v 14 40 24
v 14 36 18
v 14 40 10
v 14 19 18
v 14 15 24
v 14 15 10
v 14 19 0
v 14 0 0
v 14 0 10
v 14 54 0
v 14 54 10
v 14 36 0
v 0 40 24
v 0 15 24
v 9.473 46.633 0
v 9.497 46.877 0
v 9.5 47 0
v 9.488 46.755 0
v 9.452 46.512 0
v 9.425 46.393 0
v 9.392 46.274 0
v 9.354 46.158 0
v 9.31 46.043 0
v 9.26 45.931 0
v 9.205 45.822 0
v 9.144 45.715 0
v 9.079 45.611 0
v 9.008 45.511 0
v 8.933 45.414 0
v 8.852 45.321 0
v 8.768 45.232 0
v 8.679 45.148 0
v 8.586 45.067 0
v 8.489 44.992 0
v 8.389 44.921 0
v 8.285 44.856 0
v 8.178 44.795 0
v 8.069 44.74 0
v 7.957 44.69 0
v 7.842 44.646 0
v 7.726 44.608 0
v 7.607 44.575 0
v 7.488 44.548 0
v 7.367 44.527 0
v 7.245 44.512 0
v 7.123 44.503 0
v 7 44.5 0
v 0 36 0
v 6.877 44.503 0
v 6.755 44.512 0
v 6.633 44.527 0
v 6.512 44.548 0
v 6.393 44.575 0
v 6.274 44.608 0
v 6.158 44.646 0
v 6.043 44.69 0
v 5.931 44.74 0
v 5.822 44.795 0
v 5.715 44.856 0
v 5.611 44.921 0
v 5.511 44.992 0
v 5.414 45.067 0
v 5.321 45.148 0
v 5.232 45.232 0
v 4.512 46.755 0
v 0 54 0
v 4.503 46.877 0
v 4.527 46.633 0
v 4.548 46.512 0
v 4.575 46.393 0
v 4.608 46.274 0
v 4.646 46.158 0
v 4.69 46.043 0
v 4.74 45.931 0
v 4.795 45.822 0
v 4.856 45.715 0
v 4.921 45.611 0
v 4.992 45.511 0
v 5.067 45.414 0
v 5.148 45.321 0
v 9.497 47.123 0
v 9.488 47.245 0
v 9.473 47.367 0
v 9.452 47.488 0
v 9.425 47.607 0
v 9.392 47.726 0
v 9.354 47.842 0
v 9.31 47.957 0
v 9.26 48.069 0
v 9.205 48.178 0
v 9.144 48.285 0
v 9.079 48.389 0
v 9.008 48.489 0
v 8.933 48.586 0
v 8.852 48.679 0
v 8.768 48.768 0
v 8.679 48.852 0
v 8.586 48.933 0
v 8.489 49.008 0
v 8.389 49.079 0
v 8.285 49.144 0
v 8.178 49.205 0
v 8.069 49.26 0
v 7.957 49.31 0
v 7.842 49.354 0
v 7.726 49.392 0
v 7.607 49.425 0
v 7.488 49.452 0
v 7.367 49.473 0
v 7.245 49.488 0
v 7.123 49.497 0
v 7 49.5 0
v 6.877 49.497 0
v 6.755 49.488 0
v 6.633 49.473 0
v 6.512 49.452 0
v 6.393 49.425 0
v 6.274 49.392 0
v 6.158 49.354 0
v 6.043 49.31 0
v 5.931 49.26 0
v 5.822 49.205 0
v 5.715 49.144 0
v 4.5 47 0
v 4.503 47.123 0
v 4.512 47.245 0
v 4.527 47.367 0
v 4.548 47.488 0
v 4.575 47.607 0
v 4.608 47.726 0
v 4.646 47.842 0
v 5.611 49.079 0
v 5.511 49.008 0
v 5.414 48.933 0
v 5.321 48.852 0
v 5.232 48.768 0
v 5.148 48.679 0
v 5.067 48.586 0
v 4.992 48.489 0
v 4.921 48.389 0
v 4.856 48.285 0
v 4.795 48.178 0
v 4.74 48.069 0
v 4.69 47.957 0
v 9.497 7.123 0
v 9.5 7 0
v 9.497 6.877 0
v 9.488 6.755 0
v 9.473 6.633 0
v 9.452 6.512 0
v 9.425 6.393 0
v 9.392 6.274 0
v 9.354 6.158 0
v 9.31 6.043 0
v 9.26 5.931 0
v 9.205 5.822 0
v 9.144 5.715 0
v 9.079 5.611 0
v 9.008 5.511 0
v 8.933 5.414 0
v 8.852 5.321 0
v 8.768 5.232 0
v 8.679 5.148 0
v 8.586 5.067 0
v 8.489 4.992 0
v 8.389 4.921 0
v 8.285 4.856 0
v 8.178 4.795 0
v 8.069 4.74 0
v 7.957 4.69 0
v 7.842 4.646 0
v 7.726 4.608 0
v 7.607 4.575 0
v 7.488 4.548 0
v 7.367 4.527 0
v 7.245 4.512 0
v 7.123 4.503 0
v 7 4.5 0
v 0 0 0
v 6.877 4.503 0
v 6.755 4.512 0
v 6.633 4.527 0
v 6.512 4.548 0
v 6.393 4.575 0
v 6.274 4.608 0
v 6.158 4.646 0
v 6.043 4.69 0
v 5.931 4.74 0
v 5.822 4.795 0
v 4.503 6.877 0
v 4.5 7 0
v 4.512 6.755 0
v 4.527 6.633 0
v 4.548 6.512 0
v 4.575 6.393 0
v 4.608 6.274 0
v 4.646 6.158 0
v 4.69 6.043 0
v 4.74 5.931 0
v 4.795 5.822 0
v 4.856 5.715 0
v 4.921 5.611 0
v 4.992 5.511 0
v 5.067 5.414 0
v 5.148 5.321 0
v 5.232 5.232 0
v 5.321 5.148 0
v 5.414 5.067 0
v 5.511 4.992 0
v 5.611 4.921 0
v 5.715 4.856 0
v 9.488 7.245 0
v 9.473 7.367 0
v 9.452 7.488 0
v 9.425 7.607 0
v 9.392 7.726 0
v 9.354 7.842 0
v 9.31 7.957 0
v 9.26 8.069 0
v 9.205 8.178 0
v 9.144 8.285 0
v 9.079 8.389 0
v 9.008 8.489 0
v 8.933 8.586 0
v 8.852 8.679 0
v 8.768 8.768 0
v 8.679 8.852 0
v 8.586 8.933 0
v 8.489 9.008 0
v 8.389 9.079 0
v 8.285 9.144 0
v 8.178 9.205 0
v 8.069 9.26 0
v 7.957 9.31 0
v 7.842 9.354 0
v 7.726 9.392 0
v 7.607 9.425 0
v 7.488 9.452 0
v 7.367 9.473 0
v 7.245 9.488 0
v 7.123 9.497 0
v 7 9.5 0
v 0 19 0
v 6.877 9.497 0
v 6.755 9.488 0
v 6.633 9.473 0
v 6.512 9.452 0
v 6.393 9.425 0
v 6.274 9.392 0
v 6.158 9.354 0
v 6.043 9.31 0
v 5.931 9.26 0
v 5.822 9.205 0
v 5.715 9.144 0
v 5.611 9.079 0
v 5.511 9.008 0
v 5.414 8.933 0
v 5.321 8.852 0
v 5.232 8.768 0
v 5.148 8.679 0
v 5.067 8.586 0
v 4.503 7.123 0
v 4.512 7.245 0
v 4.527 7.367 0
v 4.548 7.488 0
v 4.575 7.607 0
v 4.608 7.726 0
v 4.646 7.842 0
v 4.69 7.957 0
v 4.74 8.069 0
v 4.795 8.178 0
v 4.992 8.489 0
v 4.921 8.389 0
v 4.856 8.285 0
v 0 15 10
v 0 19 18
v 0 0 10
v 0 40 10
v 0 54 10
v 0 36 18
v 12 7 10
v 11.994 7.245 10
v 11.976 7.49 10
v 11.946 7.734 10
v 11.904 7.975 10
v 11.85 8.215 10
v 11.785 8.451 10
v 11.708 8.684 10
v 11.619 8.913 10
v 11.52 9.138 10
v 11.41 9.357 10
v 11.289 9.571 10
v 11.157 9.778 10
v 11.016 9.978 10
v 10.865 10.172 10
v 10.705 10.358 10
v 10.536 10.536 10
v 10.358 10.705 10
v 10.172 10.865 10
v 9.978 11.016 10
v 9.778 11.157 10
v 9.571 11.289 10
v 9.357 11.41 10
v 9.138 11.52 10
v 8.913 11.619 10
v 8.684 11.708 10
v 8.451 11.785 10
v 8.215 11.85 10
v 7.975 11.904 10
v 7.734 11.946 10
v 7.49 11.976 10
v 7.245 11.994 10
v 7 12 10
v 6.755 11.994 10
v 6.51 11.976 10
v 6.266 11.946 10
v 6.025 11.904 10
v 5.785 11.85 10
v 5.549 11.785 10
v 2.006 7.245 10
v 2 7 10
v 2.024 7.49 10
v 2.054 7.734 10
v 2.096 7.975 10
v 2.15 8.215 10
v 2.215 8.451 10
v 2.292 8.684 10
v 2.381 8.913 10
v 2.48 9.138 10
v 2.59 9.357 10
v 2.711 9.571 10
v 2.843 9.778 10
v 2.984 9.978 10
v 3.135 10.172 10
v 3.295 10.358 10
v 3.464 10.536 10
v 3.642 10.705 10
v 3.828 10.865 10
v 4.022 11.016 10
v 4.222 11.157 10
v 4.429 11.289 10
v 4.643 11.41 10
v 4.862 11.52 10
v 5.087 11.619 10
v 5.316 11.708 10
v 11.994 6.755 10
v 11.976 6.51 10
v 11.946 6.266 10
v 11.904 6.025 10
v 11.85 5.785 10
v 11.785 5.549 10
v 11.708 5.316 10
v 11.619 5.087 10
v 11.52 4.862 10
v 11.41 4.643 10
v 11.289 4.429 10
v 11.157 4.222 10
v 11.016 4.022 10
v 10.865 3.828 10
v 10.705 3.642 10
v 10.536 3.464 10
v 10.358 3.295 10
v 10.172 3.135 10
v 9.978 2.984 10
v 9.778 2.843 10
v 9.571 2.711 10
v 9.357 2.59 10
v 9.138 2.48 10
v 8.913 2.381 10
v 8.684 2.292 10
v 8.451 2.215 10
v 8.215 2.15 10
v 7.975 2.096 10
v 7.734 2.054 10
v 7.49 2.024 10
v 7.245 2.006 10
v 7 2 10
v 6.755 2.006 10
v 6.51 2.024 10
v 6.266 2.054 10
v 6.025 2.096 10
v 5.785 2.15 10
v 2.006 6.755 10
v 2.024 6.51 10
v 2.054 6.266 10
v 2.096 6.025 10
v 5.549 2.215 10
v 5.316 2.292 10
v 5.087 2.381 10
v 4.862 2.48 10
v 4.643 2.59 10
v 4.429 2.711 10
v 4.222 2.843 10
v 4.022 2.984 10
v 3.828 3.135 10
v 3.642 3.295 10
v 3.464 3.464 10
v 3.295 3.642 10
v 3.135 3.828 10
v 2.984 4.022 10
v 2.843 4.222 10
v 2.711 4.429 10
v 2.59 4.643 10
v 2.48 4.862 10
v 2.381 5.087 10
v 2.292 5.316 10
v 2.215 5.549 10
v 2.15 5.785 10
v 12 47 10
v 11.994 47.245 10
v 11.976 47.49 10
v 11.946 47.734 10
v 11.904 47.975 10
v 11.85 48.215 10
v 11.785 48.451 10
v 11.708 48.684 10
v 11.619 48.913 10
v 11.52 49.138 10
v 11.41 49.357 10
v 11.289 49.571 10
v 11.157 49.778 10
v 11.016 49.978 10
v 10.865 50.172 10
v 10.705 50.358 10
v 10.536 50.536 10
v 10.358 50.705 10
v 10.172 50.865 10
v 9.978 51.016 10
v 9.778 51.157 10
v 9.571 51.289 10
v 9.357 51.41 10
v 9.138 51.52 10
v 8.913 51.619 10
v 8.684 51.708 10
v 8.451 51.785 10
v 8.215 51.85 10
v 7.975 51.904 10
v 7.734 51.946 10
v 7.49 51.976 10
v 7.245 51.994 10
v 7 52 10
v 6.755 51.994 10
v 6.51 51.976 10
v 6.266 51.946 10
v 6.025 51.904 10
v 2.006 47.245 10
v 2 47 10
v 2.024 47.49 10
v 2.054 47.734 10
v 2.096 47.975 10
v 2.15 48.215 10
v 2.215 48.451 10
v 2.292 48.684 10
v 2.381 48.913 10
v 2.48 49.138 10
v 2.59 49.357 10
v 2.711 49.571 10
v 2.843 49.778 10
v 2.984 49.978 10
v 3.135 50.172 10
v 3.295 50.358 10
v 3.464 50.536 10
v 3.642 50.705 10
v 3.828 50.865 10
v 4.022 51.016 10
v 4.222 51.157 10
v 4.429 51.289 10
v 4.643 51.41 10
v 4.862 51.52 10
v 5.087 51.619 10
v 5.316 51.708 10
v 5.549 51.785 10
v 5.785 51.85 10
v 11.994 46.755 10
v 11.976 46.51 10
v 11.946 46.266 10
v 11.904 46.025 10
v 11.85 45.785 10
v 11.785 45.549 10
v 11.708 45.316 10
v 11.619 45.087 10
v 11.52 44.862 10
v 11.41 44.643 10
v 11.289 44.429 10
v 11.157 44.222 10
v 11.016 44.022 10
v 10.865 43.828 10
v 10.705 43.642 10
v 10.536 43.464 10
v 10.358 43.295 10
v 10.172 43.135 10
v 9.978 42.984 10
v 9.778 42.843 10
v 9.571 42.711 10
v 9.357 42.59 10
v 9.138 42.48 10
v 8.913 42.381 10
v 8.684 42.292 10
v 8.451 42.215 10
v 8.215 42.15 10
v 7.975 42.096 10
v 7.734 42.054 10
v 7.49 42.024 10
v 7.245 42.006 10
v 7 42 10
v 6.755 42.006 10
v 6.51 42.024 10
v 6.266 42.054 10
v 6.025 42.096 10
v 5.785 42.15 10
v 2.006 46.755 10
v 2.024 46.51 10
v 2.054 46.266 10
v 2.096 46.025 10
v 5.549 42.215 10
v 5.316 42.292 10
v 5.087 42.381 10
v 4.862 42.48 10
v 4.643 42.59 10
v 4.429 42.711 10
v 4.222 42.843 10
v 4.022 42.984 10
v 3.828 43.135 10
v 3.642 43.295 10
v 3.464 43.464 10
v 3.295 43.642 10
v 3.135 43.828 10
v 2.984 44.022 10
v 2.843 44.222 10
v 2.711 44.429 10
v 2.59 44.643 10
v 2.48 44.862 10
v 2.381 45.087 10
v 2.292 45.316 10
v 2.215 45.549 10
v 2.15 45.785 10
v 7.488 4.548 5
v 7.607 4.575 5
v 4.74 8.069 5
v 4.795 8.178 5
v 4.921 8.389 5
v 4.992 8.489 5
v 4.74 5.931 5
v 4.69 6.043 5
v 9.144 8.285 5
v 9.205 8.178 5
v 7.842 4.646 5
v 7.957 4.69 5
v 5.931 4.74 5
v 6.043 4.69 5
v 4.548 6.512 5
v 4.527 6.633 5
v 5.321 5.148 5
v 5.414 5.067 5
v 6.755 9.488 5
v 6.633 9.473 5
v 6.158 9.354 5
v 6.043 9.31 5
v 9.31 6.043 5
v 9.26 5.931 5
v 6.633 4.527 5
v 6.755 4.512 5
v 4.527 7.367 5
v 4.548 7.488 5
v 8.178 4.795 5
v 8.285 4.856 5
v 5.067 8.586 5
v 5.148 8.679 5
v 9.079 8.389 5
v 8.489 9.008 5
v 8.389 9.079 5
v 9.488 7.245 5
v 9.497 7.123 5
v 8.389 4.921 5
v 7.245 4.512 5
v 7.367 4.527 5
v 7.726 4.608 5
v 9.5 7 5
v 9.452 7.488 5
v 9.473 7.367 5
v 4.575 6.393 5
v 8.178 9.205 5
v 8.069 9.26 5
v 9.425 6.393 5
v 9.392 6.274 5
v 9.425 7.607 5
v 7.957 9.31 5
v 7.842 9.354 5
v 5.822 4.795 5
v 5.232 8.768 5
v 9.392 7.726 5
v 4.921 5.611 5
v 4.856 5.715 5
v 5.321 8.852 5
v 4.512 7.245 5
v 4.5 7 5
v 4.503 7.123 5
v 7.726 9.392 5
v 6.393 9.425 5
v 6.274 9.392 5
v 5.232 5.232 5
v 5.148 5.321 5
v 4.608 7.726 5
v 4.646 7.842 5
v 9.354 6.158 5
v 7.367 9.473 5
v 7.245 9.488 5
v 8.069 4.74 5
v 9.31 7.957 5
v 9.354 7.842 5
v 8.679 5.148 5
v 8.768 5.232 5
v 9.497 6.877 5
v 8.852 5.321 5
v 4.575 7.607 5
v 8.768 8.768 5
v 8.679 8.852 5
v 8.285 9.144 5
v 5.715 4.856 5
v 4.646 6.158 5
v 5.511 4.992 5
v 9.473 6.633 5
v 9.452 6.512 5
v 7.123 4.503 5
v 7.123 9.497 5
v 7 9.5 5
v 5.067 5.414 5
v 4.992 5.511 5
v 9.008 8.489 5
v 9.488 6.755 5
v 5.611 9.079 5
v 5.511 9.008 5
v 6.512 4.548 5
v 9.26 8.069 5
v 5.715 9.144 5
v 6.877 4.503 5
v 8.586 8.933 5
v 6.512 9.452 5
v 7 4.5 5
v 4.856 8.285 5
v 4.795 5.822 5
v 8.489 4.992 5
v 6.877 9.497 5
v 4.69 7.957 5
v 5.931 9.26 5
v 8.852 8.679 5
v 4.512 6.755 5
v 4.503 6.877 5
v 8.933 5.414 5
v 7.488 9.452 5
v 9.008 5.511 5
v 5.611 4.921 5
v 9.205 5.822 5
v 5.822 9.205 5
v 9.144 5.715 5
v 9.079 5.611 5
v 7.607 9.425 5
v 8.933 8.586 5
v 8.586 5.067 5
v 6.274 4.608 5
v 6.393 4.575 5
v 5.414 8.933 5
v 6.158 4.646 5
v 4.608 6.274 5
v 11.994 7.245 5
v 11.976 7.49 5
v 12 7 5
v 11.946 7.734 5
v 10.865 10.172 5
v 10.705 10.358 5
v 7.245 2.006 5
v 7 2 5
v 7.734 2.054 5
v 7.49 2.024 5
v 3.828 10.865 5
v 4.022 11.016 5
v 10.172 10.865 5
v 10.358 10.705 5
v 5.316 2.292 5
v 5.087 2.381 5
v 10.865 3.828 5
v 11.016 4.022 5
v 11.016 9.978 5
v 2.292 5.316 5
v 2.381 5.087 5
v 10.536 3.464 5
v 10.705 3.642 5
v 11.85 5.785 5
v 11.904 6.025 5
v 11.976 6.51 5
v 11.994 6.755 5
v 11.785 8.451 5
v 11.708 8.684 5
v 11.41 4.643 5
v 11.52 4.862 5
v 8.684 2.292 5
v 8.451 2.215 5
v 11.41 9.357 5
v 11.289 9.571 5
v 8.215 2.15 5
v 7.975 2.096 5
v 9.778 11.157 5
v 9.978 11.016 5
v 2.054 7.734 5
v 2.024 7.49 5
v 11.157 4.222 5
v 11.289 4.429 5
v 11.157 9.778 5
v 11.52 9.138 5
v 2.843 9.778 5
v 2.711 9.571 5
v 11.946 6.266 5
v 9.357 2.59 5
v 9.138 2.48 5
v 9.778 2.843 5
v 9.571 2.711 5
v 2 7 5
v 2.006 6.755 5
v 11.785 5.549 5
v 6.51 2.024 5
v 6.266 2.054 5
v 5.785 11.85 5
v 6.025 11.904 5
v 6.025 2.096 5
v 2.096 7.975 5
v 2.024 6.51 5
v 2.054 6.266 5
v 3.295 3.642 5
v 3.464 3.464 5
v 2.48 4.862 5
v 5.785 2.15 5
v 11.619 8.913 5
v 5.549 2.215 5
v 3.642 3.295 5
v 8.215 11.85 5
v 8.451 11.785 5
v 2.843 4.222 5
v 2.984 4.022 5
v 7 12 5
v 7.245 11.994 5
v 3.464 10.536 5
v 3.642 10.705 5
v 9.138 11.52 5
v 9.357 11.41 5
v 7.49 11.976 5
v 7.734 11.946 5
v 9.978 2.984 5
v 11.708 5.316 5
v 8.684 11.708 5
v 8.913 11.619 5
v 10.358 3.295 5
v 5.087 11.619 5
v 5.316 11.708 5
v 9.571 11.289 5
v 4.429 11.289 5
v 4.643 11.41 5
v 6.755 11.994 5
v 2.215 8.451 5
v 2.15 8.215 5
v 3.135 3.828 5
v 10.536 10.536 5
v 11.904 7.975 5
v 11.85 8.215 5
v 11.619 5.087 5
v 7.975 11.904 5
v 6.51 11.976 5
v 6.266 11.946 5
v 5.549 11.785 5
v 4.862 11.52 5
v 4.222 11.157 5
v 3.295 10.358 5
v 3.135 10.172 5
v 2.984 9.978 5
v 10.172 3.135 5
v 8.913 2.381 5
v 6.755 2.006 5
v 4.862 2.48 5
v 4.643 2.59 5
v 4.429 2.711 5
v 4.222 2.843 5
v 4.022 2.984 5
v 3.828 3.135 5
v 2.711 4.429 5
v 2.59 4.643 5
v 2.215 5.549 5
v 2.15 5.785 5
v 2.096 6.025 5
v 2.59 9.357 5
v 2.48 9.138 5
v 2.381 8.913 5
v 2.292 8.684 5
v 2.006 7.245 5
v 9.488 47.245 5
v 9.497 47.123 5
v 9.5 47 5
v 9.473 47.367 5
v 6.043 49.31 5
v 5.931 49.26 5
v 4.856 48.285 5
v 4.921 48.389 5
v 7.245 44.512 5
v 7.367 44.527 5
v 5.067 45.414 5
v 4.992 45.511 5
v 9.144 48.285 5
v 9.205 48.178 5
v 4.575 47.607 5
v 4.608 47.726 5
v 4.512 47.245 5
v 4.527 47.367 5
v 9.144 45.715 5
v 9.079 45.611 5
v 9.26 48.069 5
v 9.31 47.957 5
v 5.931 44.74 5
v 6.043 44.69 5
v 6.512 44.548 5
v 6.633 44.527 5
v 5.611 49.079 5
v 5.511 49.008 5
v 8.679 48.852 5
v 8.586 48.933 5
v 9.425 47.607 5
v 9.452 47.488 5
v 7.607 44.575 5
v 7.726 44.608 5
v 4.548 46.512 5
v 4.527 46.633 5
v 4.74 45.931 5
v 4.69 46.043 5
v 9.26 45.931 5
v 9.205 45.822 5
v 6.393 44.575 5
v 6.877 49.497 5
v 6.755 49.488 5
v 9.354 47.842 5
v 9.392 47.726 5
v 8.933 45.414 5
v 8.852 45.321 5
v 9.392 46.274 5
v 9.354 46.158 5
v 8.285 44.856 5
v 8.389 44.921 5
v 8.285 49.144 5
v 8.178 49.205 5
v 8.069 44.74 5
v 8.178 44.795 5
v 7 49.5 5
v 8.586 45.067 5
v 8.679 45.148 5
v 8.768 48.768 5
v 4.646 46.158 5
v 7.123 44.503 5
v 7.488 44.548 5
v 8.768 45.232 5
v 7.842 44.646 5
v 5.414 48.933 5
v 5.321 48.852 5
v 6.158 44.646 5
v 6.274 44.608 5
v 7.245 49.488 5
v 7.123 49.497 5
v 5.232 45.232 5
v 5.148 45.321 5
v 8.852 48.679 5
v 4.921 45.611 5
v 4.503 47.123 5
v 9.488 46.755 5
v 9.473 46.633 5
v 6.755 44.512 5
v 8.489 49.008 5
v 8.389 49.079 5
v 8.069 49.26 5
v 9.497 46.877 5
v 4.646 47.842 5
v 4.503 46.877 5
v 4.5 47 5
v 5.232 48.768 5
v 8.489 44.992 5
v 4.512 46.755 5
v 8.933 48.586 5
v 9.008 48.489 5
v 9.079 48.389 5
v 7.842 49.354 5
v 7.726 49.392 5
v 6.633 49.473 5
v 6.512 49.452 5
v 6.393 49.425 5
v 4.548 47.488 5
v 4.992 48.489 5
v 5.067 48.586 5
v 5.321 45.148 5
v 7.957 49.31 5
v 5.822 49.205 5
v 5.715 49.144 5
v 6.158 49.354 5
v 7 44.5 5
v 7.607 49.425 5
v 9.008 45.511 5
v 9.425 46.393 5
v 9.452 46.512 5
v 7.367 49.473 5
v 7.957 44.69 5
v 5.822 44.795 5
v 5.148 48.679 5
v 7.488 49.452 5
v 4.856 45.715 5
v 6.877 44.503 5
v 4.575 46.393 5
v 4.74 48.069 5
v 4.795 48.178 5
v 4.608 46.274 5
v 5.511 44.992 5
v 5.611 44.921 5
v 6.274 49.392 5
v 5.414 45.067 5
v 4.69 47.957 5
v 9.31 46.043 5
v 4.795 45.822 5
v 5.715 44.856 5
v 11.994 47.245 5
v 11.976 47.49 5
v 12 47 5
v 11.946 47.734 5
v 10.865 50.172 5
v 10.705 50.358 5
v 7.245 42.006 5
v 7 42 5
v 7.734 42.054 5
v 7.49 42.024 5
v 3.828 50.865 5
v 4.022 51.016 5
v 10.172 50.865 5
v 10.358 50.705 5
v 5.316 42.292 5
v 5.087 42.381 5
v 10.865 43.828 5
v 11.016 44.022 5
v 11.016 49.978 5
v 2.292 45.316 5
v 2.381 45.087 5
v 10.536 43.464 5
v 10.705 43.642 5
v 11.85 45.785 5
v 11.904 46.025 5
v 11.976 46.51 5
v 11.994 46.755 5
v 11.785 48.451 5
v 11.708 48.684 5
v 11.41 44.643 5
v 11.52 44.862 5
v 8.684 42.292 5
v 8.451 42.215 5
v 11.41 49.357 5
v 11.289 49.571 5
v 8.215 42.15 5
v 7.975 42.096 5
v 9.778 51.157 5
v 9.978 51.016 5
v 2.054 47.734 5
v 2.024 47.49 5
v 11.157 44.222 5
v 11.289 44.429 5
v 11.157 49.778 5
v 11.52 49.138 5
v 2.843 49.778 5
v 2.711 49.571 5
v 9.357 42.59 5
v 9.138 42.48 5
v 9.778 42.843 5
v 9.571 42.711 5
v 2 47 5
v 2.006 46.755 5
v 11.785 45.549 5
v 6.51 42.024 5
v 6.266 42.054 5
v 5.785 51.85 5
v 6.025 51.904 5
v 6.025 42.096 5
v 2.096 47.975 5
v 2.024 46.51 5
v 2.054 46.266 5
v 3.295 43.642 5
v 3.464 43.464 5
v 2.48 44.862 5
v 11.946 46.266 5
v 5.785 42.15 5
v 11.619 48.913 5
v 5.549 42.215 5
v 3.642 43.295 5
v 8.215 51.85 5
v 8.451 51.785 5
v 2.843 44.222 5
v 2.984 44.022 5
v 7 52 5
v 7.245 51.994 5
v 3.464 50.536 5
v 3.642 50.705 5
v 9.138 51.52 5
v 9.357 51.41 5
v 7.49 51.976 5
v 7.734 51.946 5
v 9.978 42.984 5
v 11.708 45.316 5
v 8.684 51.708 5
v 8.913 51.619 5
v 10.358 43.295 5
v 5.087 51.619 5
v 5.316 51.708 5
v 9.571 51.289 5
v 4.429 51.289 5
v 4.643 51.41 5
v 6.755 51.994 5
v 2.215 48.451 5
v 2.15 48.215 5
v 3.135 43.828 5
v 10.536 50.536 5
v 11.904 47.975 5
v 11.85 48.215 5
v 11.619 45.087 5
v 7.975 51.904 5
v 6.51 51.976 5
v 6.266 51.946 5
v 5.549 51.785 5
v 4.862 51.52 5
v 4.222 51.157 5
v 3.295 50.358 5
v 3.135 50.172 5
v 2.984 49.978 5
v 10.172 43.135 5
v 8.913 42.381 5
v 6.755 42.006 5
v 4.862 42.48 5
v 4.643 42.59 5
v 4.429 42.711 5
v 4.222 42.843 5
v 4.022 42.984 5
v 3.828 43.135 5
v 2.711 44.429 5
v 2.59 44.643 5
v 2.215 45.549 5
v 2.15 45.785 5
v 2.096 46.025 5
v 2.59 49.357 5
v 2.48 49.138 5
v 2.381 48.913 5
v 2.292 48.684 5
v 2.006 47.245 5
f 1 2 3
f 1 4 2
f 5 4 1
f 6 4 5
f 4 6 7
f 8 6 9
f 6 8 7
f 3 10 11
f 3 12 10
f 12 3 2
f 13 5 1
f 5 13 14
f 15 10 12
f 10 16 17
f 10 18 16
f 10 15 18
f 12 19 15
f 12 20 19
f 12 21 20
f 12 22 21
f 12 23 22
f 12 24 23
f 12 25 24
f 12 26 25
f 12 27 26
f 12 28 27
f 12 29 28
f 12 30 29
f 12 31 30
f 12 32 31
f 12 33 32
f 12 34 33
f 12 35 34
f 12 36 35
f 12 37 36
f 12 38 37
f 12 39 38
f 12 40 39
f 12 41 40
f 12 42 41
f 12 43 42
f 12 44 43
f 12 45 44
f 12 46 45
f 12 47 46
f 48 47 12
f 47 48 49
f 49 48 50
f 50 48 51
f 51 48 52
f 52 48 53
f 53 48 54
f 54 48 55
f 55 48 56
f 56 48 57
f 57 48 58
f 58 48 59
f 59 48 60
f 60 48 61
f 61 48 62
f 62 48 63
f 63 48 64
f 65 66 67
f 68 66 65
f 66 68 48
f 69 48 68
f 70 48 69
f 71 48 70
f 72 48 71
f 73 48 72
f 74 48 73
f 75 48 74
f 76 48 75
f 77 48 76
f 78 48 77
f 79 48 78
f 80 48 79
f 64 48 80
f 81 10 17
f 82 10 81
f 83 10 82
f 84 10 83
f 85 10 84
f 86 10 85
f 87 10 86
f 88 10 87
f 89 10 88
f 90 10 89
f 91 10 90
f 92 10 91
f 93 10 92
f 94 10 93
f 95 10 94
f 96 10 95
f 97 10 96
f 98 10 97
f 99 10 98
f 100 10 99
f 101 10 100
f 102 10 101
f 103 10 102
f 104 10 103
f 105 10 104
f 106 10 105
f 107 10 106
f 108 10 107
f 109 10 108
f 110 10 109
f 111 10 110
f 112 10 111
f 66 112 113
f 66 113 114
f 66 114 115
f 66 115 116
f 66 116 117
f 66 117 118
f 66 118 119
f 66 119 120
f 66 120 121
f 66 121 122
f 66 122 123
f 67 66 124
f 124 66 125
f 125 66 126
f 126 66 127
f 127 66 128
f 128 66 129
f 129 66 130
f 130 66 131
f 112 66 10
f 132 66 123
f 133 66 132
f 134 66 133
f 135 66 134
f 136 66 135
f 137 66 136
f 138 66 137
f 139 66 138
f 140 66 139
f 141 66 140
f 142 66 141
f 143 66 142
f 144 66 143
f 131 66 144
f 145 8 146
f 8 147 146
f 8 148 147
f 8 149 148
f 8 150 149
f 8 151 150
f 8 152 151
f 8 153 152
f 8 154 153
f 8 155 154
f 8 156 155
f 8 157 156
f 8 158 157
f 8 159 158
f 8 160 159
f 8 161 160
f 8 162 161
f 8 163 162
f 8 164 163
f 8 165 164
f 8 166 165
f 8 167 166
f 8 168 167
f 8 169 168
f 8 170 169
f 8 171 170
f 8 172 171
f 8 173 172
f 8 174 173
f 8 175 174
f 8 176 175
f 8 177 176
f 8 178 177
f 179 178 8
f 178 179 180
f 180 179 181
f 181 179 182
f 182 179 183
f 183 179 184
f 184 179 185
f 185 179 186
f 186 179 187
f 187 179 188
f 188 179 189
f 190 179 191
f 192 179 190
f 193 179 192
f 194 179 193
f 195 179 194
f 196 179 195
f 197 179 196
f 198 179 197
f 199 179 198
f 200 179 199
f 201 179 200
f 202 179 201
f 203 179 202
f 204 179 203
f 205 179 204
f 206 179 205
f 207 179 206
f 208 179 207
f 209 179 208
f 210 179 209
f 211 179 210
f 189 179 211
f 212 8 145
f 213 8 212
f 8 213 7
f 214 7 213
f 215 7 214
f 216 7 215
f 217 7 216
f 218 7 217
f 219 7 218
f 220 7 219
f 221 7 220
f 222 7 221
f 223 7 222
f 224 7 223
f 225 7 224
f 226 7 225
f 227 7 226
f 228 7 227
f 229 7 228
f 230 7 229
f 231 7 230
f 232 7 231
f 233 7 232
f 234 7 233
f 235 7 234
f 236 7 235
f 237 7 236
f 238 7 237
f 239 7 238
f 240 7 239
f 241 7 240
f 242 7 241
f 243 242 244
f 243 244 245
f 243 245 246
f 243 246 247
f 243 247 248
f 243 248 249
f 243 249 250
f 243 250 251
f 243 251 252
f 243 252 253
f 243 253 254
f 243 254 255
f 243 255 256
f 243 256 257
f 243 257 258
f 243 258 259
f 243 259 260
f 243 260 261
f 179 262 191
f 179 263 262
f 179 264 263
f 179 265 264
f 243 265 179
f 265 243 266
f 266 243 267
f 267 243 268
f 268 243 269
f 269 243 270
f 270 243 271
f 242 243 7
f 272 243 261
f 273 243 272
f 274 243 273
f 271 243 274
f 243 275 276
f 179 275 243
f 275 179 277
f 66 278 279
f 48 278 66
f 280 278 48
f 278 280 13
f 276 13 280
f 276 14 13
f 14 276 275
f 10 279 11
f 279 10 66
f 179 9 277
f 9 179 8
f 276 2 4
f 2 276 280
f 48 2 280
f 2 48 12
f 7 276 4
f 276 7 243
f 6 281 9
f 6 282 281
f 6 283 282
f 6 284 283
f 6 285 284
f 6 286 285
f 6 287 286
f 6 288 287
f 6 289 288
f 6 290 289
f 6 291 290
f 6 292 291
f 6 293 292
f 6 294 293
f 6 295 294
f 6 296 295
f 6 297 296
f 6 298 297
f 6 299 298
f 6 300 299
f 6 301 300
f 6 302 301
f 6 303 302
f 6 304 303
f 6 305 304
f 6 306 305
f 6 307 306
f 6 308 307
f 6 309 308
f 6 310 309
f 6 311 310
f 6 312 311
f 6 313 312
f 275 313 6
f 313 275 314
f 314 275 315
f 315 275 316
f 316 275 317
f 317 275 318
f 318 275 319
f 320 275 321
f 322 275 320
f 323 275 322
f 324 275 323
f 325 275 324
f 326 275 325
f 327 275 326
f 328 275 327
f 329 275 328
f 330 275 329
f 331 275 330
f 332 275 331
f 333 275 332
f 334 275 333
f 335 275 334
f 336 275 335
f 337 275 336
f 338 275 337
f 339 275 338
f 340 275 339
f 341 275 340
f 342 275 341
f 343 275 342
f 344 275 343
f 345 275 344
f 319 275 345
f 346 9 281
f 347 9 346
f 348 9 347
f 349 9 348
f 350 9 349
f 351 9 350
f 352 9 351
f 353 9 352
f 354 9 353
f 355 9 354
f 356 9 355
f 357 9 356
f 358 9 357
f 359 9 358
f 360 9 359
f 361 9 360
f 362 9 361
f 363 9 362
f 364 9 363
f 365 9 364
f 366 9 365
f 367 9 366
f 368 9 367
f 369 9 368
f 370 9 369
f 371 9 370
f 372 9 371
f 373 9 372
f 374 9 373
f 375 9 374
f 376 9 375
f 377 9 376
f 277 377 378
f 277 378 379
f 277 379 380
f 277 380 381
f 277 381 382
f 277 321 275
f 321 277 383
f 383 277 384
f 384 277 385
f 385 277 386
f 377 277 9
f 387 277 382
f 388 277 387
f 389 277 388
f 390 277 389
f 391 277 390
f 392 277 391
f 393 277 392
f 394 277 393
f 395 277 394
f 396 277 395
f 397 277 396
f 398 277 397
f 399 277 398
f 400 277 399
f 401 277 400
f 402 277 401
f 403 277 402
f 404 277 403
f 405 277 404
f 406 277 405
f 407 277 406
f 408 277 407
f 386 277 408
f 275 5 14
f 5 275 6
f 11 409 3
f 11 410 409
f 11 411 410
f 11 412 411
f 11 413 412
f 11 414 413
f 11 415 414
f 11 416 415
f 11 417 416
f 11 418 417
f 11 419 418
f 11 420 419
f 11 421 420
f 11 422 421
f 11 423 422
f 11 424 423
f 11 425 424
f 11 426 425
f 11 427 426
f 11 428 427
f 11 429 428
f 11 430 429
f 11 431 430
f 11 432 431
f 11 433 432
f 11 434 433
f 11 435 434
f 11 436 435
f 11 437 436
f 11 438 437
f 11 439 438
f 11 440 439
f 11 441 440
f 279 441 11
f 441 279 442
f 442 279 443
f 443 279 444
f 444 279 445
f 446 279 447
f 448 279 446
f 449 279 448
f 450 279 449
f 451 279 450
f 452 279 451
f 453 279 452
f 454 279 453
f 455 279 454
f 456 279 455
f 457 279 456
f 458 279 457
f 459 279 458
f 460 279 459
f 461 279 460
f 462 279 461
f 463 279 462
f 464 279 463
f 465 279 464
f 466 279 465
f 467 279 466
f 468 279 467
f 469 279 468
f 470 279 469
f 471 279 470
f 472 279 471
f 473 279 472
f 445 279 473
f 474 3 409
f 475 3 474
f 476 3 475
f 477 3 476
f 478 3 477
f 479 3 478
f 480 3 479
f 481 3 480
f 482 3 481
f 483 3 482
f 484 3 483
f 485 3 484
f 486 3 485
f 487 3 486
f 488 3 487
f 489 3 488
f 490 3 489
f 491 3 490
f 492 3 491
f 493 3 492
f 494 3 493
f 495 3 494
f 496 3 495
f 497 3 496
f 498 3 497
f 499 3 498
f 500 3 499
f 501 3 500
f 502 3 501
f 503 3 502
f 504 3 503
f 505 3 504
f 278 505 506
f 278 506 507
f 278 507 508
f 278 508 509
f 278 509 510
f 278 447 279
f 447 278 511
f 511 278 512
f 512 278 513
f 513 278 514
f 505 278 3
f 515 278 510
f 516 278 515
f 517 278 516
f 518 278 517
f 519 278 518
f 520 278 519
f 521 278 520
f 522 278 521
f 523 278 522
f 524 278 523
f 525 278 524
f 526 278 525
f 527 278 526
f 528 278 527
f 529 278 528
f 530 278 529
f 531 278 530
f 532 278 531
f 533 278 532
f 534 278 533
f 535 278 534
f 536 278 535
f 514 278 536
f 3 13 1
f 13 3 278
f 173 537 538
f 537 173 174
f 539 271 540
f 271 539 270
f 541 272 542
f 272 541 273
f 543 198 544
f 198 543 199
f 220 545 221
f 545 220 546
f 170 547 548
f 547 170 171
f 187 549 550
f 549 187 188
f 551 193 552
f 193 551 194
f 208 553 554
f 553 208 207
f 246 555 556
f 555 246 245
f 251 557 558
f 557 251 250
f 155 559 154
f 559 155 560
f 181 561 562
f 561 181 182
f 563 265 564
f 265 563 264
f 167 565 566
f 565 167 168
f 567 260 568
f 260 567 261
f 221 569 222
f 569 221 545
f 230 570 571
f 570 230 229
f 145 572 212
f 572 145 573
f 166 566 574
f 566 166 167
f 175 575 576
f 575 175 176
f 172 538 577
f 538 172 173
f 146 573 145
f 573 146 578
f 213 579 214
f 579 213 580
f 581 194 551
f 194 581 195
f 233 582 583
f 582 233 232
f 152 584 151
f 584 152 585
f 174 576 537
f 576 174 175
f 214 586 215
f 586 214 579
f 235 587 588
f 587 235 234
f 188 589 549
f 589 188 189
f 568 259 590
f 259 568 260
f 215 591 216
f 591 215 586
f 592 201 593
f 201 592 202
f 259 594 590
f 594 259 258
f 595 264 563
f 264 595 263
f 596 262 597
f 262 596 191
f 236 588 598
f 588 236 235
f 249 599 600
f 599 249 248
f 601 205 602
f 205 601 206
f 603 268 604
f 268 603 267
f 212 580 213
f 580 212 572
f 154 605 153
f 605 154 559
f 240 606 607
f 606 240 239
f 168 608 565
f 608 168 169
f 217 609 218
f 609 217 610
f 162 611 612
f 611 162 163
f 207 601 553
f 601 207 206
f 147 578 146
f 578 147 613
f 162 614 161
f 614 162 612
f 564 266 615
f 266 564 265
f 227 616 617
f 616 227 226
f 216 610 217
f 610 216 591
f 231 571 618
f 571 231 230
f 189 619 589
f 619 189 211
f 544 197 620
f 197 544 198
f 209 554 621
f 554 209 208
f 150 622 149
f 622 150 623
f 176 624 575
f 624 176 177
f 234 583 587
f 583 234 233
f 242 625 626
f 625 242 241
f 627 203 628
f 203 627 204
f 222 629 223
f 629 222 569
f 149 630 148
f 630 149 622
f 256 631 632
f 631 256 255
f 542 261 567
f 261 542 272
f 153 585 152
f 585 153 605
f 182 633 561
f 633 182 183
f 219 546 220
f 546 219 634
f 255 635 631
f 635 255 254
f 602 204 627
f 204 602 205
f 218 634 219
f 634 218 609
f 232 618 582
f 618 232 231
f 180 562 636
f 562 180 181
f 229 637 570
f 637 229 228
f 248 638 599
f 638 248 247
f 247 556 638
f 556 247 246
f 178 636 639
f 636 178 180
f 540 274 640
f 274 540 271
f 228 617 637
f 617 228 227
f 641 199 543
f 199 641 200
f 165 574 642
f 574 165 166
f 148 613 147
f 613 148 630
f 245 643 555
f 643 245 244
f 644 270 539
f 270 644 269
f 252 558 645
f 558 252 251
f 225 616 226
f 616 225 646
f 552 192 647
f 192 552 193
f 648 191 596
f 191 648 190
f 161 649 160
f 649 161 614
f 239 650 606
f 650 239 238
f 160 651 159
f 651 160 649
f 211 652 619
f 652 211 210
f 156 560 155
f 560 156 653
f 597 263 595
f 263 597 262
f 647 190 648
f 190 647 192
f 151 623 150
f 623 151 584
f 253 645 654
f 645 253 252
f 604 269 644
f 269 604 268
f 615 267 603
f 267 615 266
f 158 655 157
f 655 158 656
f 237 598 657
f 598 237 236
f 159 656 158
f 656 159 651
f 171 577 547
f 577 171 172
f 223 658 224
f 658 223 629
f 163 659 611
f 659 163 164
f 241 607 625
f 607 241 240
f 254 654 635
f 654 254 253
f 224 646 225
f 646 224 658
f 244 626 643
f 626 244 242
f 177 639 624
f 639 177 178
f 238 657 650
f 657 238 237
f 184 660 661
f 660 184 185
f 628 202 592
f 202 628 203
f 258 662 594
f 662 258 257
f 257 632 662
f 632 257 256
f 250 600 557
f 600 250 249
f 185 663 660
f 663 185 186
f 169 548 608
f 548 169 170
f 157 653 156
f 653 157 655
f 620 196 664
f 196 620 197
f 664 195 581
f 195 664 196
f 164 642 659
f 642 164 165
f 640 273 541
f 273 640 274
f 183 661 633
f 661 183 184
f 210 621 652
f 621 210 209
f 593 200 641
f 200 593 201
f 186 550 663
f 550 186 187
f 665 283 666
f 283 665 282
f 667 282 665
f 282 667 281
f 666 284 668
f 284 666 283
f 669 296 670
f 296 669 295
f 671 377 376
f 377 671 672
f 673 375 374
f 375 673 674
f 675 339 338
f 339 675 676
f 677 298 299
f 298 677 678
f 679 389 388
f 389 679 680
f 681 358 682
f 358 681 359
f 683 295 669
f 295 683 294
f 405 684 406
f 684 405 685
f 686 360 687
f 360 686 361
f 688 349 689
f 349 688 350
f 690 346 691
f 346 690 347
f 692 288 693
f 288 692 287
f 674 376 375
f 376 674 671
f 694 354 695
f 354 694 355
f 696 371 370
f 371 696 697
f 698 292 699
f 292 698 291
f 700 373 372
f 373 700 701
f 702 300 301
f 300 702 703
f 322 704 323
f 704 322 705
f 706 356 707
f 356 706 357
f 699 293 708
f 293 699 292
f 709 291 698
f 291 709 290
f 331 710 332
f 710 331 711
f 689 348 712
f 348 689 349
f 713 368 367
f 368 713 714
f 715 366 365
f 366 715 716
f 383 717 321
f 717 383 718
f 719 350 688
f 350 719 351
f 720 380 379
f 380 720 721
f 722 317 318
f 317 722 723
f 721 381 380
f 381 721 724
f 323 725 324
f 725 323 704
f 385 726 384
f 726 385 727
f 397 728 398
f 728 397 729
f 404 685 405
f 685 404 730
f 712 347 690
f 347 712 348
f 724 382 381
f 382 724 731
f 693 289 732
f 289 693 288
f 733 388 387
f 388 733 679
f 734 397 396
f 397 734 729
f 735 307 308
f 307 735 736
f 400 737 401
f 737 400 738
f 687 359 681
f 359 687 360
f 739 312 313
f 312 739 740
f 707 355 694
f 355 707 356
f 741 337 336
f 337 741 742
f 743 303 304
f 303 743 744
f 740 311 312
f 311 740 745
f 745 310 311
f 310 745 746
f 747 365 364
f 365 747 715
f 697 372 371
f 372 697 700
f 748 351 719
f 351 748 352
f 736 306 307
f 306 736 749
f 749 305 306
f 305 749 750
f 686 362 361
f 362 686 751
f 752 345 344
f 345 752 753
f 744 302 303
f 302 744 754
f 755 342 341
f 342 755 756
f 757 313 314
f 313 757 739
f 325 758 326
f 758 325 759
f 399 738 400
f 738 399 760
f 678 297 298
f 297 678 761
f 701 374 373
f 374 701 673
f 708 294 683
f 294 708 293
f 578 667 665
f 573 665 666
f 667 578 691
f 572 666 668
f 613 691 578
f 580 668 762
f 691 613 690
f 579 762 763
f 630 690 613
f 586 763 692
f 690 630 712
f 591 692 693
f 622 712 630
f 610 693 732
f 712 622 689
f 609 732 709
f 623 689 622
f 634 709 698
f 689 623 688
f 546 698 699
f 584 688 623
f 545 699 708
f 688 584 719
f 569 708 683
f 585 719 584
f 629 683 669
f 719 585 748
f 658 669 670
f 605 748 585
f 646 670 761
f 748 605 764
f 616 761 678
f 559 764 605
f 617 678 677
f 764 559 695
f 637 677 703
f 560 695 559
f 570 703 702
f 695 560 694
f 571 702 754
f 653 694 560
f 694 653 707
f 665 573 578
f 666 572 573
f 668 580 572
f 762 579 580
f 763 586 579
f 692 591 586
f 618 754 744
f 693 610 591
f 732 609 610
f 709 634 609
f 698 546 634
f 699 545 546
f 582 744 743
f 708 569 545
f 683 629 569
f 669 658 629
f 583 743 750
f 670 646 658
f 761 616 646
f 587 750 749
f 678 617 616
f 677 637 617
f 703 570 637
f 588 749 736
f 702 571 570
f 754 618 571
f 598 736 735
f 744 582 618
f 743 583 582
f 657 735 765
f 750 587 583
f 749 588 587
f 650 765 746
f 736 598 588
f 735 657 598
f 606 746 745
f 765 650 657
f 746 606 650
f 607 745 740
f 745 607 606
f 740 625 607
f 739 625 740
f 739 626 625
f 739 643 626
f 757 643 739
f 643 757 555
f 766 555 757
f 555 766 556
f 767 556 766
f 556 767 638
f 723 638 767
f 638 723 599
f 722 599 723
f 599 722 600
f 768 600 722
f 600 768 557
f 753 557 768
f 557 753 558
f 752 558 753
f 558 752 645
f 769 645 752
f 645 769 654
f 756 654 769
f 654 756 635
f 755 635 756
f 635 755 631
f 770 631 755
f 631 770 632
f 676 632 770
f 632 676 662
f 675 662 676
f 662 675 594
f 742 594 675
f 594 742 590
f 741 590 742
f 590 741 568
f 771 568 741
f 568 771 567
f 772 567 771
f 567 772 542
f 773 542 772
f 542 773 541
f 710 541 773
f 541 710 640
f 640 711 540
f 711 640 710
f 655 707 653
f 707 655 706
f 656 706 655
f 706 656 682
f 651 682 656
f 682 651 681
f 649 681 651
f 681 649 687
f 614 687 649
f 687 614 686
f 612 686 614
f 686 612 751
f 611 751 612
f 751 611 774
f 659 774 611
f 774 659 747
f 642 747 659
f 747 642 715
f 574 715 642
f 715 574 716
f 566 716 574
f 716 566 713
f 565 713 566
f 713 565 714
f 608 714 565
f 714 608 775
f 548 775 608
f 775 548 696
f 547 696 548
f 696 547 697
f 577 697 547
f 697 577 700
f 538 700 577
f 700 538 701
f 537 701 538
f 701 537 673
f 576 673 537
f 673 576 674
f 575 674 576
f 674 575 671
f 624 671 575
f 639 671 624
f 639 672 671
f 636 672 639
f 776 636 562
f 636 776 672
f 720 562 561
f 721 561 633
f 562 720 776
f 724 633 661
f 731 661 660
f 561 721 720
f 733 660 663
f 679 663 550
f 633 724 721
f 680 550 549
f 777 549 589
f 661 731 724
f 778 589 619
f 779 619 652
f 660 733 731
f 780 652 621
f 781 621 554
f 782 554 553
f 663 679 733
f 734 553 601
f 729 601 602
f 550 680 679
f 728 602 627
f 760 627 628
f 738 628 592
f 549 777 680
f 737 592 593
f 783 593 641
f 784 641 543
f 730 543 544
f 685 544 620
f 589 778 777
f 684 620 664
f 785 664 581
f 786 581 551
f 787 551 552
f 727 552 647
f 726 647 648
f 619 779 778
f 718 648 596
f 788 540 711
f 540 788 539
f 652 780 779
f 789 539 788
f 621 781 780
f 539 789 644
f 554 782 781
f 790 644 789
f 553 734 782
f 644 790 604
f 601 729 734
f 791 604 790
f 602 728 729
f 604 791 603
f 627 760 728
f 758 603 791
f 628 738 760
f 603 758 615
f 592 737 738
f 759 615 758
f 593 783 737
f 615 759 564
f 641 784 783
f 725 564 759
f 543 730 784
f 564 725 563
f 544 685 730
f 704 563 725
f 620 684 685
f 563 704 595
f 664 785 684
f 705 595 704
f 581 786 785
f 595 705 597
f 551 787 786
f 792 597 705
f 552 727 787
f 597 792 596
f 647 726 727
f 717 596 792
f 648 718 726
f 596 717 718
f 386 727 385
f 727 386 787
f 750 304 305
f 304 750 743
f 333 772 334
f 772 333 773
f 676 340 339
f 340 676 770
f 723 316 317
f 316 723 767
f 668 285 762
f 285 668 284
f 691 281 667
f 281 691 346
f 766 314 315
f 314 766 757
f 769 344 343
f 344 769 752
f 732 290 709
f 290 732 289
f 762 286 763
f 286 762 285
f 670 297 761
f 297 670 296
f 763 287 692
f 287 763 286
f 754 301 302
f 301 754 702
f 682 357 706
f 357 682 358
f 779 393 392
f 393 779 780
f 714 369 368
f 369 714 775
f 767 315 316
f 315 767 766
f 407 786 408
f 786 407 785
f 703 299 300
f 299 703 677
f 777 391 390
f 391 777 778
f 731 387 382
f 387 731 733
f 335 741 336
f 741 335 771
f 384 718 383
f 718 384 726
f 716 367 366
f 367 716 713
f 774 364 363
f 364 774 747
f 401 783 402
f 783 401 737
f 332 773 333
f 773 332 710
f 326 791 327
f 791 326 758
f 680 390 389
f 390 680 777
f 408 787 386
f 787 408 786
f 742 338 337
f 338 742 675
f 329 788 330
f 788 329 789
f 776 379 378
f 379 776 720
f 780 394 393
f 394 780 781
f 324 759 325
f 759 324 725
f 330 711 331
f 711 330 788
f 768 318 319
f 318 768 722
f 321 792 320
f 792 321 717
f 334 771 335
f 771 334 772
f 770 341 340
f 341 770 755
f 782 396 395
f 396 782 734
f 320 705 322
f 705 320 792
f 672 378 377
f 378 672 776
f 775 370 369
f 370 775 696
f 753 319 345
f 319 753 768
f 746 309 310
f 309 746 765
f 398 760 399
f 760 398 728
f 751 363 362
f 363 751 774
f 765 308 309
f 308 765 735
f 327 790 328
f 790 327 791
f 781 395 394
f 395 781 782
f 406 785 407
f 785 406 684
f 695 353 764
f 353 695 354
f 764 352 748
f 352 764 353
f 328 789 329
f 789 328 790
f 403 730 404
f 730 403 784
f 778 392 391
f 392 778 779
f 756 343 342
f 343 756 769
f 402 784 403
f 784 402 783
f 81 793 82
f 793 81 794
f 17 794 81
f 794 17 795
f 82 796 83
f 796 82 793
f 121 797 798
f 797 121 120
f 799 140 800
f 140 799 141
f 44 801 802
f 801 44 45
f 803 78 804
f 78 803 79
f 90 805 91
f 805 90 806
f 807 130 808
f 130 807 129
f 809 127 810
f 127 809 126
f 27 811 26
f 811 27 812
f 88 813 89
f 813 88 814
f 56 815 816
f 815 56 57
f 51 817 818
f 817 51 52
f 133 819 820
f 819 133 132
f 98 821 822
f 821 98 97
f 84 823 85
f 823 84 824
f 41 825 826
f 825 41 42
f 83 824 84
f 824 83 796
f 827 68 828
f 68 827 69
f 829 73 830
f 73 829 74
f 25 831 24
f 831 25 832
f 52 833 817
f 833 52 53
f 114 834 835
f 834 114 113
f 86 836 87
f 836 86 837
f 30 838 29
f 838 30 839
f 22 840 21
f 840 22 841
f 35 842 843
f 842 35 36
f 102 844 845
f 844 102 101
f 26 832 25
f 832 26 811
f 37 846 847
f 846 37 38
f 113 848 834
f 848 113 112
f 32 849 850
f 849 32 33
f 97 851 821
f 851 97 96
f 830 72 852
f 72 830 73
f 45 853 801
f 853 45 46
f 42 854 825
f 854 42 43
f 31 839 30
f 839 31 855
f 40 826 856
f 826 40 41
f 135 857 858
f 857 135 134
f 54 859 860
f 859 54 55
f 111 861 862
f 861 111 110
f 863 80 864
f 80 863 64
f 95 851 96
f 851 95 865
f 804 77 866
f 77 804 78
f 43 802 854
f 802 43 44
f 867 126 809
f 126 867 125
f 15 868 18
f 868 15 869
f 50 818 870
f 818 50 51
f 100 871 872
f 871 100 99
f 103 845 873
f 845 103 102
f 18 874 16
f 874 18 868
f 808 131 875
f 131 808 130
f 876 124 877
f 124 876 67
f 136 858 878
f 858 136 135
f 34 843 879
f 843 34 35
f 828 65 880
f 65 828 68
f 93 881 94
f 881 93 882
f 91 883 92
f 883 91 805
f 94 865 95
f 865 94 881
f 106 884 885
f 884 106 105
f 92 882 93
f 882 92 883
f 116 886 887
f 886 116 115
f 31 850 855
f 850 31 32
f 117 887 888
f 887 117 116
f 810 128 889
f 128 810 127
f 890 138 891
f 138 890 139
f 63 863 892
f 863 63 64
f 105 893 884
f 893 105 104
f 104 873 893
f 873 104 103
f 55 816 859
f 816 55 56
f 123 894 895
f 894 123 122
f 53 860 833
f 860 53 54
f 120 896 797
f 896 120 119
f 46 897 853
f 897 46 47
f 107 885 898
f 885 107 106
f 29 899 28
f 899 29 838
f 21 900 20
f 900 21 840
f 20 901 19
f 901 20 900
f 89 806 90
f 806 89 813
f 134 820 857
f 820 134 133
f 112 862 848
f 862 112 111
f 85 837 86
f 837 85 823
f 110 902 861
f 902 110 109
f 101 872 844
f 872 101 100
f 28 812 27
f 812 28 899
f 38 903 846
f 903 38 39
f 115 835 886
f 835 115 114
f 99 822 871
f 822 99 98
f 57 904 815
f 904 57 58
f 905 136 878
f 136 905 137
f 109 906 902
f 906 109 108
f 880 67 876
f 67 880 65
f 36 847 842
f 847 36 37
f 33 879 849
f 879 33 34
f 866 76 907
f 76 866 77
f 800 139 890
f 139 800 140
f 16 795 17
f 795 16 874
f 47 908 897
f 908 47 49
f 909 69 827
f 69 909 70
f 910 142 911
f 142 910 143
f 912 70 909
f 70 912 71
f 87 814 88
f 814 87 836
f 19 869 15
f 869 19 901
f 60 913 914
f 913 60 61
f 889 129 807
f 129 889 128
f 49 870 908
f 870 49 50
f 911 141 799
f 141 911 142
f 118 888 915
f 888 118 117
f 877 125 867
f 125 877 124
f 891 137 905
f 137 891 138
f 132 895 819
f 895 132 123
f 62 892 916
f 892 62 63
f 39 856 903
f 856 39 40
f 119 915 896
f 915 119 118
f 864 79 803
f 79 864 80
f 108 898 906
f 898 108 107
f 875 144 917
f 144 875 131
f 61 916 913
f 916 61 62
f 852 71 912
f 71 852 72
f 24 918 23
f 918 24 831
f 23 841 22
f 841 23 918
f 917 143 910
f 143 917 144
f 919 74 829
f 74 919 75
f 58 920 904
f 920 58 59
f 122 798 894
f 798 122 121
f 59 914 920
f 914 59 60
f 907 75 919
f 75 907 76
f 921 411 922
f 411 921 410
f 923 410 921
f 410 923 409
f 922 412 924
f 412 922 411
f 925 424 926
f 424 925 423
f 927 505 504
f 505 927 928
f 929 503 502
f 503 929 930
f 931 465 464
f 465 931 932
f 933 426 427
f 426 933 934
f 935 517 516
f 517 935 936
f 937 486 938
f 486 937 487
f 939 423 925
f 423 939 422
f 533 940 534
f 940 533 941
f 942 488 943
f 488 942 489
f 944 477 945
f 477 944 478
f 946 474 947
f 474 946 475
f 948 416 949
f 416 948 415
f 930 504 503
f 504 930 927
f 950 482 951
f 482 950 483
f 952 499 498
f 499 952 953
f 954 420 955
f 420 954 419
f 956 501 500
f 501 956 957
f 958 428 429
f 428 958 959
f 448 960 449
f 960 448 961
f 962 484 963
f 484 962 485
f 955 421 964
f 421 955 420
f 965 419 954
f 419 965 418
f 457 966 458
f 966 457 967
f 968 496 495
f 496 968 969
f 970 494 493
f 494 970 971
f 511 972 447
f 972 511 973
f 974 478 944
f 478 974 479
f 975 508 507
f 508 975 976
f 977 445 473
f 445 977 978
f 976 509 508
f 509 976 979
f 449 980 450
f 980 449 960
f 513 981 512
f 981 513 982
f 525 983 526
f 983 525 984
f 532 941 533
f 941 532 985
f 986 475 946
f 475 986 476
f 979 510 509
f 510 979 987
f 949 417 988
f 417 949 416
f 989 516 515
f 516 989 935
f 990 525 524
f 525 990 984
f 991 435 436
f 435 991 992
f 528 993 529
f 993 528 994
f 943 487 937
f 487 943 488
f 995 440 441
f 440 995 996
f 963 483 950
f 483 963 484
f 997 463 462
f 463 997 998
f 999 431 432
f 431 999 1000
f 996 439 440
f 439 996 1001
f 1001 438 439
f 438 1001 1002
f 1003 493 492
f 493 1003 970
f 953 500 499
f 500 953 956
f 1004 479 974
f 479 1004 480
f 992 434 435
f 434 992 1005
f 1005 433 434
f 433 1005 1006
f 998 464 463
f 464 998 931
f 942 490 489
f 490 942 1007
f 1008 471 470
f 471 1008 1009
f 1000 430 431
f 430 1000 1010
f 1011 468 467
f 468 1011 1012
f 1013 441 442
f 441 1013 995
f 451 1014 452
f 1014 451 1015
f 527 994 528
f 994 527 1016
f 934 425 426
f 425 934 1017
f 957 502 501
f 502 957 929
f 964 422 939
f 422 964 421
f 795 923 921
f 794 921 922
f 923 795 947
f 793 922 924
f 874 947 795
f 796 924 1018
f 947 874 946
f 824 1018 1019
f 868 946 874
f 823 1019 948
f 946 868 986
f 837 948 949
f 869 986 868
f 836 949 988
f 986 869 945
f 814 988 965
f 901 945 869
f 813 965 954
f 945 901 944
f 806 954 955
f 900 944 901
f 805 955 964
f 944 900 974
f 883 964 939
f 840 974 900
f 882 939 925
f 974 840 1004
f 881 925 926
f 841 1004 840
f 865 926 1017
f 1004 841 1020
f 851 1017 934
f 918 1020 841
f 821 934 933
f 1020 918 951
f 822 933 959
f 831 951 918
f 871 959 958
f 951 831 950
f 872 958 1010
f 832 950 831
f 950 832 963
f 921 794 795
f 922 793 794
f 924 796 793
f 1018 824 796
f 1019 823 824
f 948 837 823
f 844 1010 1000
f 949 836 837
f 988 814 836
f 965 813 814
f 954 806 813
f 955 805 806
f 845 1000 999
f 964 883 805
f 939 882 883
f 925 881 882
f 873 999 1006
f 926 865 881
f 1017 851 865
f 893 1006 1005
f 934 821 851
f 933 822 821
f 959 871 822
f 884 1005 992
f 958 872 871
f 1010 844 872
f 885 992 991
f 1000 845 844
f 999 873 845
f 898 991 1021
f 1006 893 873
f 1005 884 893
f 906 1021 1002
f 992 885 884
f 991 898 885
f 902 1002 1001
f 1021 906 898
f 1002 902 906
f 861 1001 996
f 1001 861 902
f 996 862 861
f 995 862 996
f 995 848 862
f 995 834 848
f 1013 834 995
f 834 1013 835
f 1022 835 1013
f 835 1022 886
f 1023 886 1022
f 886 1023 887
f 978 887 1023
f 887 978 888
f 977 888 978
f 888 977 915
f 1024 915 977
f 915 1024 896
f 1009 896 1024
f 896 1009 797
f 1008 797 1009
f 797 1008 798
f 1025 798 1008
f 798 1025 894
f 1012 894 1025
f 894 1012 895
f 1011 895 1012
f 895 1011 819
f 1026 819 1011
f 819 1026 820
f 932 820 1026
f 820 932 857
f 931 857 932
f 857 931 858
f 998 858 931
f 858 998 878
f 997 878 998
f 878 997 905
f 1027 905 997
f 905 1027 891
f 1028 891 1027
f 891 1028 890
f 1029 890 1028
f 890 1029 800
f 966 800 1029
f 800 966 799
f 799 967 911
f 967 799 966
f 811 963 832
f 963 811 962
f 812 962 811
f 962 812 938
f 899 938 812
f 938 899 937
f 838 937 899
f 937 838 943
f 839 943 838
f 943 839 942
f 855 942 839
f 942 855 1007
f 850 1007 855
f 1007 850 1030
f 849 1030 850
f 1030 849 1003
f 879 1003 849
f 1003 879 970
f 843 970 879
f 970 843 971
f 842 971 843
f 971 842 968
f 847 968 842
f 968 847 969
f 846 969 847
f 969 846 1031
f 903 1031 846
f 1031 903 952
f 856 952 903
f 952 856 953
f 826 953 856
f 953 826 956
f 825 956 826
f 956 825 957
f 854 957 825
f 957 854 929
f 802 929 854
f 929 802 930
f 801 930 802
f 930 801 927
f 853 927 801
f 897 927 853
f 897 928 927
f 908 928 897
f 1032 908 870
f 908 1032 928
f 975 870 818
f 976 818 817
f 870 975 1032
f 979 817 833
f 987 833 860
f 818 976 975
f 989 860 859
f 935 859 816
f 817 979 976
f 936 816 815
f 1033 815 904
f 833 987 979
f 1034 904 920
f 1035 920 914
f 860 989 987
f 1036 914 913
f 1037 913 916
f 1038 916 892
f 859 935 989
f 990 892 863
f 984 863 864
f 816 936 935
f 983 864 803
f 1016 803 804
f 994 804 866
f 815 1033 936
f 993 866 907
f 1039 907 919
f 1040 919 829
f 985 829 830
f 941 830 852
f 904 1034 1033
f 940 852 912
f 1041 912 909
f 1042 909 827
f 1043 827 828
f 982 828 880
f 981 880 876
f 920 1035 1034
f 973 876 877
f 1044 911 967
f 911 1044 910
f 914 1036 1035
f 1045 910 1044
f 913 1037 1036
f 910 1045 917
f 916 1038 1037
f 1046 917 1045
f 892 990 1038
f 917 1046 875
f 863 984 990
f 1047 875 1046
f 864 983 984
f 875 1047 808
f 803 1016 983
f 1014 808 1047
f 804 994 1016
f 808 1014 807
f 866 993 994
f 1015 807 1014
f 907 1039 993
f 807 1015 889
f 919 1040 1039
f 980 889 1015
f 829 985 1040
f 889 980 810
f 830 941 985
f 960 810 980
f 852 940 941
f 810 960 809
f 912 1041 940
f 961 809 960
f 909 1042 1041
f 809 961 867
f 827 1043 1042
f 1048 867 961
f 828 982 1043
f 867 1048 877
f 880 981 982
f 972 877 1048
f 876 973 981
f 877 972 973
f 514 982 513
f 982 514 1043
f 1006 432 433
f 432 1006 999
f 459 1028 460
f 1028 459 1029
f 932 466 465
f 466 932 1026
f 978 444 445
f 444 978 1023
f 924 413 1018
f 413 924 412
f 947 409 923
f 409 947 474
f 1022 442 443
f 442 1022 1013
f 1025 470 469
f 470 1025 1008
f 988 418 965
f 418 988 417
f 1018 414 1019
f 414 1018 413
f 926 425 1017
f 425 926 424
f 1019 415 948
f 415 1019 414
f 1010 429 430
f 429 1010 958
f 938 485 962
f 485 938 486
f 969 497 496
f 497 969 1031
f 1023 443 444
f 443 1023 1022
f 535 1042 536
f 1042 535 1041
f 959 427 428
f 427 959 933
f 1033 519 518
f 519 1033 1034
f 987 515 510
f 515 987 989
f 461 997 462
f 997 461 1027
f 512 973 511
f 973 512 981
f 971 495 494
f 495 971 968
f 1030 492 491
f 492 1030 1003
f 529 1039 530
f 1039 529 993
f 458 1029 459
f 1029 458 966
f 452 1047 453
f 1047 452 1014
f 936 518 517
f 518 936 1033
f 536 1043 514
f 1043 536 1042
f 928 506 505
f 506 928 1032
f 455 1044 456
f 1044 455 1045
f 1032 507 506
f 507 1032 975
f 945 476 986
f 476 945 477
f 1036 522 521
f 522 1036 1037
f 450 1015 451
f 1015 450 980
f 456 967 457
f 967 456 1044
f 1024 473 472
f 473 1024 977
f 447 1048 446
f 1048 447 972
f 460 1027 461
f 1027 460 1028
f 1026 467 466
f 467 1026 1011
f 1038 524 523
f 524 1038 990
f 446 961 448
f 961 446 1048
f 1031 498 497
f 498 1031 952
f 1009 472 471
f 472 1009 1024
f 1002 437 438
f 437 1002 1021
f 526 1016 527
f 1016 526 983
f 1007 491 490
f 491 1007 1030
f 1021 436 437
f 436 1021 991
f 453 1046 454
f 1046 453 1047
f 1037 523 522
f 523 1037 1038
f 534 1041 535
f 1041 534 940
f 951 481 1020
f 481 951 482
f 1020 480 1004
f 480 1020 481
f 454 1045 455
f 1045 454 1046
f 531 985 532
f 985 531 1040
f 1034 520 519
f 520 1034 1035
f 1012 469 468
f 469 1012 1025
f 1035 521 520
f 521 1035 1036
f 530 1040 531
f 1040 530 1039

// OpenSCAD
$fn=128;
difference()
{
  cube([14,54,24]);
  translate([-5,19,-2]) cube([20,17,20]);
  translate([-5,-5,10]) cube([30,20,30]);
  translate([-5,40,10]) cube([30,15,30]);
  translate([7,7,-5]) cylinder(h=20,d=5);
  translate([7,7,5]) cylinder(h=20,d=10);
  translate([7,47,-5]) cylinder(h=20,d=5);
  translate([7,47,5]) cylinder(h=20,d=10);
}
